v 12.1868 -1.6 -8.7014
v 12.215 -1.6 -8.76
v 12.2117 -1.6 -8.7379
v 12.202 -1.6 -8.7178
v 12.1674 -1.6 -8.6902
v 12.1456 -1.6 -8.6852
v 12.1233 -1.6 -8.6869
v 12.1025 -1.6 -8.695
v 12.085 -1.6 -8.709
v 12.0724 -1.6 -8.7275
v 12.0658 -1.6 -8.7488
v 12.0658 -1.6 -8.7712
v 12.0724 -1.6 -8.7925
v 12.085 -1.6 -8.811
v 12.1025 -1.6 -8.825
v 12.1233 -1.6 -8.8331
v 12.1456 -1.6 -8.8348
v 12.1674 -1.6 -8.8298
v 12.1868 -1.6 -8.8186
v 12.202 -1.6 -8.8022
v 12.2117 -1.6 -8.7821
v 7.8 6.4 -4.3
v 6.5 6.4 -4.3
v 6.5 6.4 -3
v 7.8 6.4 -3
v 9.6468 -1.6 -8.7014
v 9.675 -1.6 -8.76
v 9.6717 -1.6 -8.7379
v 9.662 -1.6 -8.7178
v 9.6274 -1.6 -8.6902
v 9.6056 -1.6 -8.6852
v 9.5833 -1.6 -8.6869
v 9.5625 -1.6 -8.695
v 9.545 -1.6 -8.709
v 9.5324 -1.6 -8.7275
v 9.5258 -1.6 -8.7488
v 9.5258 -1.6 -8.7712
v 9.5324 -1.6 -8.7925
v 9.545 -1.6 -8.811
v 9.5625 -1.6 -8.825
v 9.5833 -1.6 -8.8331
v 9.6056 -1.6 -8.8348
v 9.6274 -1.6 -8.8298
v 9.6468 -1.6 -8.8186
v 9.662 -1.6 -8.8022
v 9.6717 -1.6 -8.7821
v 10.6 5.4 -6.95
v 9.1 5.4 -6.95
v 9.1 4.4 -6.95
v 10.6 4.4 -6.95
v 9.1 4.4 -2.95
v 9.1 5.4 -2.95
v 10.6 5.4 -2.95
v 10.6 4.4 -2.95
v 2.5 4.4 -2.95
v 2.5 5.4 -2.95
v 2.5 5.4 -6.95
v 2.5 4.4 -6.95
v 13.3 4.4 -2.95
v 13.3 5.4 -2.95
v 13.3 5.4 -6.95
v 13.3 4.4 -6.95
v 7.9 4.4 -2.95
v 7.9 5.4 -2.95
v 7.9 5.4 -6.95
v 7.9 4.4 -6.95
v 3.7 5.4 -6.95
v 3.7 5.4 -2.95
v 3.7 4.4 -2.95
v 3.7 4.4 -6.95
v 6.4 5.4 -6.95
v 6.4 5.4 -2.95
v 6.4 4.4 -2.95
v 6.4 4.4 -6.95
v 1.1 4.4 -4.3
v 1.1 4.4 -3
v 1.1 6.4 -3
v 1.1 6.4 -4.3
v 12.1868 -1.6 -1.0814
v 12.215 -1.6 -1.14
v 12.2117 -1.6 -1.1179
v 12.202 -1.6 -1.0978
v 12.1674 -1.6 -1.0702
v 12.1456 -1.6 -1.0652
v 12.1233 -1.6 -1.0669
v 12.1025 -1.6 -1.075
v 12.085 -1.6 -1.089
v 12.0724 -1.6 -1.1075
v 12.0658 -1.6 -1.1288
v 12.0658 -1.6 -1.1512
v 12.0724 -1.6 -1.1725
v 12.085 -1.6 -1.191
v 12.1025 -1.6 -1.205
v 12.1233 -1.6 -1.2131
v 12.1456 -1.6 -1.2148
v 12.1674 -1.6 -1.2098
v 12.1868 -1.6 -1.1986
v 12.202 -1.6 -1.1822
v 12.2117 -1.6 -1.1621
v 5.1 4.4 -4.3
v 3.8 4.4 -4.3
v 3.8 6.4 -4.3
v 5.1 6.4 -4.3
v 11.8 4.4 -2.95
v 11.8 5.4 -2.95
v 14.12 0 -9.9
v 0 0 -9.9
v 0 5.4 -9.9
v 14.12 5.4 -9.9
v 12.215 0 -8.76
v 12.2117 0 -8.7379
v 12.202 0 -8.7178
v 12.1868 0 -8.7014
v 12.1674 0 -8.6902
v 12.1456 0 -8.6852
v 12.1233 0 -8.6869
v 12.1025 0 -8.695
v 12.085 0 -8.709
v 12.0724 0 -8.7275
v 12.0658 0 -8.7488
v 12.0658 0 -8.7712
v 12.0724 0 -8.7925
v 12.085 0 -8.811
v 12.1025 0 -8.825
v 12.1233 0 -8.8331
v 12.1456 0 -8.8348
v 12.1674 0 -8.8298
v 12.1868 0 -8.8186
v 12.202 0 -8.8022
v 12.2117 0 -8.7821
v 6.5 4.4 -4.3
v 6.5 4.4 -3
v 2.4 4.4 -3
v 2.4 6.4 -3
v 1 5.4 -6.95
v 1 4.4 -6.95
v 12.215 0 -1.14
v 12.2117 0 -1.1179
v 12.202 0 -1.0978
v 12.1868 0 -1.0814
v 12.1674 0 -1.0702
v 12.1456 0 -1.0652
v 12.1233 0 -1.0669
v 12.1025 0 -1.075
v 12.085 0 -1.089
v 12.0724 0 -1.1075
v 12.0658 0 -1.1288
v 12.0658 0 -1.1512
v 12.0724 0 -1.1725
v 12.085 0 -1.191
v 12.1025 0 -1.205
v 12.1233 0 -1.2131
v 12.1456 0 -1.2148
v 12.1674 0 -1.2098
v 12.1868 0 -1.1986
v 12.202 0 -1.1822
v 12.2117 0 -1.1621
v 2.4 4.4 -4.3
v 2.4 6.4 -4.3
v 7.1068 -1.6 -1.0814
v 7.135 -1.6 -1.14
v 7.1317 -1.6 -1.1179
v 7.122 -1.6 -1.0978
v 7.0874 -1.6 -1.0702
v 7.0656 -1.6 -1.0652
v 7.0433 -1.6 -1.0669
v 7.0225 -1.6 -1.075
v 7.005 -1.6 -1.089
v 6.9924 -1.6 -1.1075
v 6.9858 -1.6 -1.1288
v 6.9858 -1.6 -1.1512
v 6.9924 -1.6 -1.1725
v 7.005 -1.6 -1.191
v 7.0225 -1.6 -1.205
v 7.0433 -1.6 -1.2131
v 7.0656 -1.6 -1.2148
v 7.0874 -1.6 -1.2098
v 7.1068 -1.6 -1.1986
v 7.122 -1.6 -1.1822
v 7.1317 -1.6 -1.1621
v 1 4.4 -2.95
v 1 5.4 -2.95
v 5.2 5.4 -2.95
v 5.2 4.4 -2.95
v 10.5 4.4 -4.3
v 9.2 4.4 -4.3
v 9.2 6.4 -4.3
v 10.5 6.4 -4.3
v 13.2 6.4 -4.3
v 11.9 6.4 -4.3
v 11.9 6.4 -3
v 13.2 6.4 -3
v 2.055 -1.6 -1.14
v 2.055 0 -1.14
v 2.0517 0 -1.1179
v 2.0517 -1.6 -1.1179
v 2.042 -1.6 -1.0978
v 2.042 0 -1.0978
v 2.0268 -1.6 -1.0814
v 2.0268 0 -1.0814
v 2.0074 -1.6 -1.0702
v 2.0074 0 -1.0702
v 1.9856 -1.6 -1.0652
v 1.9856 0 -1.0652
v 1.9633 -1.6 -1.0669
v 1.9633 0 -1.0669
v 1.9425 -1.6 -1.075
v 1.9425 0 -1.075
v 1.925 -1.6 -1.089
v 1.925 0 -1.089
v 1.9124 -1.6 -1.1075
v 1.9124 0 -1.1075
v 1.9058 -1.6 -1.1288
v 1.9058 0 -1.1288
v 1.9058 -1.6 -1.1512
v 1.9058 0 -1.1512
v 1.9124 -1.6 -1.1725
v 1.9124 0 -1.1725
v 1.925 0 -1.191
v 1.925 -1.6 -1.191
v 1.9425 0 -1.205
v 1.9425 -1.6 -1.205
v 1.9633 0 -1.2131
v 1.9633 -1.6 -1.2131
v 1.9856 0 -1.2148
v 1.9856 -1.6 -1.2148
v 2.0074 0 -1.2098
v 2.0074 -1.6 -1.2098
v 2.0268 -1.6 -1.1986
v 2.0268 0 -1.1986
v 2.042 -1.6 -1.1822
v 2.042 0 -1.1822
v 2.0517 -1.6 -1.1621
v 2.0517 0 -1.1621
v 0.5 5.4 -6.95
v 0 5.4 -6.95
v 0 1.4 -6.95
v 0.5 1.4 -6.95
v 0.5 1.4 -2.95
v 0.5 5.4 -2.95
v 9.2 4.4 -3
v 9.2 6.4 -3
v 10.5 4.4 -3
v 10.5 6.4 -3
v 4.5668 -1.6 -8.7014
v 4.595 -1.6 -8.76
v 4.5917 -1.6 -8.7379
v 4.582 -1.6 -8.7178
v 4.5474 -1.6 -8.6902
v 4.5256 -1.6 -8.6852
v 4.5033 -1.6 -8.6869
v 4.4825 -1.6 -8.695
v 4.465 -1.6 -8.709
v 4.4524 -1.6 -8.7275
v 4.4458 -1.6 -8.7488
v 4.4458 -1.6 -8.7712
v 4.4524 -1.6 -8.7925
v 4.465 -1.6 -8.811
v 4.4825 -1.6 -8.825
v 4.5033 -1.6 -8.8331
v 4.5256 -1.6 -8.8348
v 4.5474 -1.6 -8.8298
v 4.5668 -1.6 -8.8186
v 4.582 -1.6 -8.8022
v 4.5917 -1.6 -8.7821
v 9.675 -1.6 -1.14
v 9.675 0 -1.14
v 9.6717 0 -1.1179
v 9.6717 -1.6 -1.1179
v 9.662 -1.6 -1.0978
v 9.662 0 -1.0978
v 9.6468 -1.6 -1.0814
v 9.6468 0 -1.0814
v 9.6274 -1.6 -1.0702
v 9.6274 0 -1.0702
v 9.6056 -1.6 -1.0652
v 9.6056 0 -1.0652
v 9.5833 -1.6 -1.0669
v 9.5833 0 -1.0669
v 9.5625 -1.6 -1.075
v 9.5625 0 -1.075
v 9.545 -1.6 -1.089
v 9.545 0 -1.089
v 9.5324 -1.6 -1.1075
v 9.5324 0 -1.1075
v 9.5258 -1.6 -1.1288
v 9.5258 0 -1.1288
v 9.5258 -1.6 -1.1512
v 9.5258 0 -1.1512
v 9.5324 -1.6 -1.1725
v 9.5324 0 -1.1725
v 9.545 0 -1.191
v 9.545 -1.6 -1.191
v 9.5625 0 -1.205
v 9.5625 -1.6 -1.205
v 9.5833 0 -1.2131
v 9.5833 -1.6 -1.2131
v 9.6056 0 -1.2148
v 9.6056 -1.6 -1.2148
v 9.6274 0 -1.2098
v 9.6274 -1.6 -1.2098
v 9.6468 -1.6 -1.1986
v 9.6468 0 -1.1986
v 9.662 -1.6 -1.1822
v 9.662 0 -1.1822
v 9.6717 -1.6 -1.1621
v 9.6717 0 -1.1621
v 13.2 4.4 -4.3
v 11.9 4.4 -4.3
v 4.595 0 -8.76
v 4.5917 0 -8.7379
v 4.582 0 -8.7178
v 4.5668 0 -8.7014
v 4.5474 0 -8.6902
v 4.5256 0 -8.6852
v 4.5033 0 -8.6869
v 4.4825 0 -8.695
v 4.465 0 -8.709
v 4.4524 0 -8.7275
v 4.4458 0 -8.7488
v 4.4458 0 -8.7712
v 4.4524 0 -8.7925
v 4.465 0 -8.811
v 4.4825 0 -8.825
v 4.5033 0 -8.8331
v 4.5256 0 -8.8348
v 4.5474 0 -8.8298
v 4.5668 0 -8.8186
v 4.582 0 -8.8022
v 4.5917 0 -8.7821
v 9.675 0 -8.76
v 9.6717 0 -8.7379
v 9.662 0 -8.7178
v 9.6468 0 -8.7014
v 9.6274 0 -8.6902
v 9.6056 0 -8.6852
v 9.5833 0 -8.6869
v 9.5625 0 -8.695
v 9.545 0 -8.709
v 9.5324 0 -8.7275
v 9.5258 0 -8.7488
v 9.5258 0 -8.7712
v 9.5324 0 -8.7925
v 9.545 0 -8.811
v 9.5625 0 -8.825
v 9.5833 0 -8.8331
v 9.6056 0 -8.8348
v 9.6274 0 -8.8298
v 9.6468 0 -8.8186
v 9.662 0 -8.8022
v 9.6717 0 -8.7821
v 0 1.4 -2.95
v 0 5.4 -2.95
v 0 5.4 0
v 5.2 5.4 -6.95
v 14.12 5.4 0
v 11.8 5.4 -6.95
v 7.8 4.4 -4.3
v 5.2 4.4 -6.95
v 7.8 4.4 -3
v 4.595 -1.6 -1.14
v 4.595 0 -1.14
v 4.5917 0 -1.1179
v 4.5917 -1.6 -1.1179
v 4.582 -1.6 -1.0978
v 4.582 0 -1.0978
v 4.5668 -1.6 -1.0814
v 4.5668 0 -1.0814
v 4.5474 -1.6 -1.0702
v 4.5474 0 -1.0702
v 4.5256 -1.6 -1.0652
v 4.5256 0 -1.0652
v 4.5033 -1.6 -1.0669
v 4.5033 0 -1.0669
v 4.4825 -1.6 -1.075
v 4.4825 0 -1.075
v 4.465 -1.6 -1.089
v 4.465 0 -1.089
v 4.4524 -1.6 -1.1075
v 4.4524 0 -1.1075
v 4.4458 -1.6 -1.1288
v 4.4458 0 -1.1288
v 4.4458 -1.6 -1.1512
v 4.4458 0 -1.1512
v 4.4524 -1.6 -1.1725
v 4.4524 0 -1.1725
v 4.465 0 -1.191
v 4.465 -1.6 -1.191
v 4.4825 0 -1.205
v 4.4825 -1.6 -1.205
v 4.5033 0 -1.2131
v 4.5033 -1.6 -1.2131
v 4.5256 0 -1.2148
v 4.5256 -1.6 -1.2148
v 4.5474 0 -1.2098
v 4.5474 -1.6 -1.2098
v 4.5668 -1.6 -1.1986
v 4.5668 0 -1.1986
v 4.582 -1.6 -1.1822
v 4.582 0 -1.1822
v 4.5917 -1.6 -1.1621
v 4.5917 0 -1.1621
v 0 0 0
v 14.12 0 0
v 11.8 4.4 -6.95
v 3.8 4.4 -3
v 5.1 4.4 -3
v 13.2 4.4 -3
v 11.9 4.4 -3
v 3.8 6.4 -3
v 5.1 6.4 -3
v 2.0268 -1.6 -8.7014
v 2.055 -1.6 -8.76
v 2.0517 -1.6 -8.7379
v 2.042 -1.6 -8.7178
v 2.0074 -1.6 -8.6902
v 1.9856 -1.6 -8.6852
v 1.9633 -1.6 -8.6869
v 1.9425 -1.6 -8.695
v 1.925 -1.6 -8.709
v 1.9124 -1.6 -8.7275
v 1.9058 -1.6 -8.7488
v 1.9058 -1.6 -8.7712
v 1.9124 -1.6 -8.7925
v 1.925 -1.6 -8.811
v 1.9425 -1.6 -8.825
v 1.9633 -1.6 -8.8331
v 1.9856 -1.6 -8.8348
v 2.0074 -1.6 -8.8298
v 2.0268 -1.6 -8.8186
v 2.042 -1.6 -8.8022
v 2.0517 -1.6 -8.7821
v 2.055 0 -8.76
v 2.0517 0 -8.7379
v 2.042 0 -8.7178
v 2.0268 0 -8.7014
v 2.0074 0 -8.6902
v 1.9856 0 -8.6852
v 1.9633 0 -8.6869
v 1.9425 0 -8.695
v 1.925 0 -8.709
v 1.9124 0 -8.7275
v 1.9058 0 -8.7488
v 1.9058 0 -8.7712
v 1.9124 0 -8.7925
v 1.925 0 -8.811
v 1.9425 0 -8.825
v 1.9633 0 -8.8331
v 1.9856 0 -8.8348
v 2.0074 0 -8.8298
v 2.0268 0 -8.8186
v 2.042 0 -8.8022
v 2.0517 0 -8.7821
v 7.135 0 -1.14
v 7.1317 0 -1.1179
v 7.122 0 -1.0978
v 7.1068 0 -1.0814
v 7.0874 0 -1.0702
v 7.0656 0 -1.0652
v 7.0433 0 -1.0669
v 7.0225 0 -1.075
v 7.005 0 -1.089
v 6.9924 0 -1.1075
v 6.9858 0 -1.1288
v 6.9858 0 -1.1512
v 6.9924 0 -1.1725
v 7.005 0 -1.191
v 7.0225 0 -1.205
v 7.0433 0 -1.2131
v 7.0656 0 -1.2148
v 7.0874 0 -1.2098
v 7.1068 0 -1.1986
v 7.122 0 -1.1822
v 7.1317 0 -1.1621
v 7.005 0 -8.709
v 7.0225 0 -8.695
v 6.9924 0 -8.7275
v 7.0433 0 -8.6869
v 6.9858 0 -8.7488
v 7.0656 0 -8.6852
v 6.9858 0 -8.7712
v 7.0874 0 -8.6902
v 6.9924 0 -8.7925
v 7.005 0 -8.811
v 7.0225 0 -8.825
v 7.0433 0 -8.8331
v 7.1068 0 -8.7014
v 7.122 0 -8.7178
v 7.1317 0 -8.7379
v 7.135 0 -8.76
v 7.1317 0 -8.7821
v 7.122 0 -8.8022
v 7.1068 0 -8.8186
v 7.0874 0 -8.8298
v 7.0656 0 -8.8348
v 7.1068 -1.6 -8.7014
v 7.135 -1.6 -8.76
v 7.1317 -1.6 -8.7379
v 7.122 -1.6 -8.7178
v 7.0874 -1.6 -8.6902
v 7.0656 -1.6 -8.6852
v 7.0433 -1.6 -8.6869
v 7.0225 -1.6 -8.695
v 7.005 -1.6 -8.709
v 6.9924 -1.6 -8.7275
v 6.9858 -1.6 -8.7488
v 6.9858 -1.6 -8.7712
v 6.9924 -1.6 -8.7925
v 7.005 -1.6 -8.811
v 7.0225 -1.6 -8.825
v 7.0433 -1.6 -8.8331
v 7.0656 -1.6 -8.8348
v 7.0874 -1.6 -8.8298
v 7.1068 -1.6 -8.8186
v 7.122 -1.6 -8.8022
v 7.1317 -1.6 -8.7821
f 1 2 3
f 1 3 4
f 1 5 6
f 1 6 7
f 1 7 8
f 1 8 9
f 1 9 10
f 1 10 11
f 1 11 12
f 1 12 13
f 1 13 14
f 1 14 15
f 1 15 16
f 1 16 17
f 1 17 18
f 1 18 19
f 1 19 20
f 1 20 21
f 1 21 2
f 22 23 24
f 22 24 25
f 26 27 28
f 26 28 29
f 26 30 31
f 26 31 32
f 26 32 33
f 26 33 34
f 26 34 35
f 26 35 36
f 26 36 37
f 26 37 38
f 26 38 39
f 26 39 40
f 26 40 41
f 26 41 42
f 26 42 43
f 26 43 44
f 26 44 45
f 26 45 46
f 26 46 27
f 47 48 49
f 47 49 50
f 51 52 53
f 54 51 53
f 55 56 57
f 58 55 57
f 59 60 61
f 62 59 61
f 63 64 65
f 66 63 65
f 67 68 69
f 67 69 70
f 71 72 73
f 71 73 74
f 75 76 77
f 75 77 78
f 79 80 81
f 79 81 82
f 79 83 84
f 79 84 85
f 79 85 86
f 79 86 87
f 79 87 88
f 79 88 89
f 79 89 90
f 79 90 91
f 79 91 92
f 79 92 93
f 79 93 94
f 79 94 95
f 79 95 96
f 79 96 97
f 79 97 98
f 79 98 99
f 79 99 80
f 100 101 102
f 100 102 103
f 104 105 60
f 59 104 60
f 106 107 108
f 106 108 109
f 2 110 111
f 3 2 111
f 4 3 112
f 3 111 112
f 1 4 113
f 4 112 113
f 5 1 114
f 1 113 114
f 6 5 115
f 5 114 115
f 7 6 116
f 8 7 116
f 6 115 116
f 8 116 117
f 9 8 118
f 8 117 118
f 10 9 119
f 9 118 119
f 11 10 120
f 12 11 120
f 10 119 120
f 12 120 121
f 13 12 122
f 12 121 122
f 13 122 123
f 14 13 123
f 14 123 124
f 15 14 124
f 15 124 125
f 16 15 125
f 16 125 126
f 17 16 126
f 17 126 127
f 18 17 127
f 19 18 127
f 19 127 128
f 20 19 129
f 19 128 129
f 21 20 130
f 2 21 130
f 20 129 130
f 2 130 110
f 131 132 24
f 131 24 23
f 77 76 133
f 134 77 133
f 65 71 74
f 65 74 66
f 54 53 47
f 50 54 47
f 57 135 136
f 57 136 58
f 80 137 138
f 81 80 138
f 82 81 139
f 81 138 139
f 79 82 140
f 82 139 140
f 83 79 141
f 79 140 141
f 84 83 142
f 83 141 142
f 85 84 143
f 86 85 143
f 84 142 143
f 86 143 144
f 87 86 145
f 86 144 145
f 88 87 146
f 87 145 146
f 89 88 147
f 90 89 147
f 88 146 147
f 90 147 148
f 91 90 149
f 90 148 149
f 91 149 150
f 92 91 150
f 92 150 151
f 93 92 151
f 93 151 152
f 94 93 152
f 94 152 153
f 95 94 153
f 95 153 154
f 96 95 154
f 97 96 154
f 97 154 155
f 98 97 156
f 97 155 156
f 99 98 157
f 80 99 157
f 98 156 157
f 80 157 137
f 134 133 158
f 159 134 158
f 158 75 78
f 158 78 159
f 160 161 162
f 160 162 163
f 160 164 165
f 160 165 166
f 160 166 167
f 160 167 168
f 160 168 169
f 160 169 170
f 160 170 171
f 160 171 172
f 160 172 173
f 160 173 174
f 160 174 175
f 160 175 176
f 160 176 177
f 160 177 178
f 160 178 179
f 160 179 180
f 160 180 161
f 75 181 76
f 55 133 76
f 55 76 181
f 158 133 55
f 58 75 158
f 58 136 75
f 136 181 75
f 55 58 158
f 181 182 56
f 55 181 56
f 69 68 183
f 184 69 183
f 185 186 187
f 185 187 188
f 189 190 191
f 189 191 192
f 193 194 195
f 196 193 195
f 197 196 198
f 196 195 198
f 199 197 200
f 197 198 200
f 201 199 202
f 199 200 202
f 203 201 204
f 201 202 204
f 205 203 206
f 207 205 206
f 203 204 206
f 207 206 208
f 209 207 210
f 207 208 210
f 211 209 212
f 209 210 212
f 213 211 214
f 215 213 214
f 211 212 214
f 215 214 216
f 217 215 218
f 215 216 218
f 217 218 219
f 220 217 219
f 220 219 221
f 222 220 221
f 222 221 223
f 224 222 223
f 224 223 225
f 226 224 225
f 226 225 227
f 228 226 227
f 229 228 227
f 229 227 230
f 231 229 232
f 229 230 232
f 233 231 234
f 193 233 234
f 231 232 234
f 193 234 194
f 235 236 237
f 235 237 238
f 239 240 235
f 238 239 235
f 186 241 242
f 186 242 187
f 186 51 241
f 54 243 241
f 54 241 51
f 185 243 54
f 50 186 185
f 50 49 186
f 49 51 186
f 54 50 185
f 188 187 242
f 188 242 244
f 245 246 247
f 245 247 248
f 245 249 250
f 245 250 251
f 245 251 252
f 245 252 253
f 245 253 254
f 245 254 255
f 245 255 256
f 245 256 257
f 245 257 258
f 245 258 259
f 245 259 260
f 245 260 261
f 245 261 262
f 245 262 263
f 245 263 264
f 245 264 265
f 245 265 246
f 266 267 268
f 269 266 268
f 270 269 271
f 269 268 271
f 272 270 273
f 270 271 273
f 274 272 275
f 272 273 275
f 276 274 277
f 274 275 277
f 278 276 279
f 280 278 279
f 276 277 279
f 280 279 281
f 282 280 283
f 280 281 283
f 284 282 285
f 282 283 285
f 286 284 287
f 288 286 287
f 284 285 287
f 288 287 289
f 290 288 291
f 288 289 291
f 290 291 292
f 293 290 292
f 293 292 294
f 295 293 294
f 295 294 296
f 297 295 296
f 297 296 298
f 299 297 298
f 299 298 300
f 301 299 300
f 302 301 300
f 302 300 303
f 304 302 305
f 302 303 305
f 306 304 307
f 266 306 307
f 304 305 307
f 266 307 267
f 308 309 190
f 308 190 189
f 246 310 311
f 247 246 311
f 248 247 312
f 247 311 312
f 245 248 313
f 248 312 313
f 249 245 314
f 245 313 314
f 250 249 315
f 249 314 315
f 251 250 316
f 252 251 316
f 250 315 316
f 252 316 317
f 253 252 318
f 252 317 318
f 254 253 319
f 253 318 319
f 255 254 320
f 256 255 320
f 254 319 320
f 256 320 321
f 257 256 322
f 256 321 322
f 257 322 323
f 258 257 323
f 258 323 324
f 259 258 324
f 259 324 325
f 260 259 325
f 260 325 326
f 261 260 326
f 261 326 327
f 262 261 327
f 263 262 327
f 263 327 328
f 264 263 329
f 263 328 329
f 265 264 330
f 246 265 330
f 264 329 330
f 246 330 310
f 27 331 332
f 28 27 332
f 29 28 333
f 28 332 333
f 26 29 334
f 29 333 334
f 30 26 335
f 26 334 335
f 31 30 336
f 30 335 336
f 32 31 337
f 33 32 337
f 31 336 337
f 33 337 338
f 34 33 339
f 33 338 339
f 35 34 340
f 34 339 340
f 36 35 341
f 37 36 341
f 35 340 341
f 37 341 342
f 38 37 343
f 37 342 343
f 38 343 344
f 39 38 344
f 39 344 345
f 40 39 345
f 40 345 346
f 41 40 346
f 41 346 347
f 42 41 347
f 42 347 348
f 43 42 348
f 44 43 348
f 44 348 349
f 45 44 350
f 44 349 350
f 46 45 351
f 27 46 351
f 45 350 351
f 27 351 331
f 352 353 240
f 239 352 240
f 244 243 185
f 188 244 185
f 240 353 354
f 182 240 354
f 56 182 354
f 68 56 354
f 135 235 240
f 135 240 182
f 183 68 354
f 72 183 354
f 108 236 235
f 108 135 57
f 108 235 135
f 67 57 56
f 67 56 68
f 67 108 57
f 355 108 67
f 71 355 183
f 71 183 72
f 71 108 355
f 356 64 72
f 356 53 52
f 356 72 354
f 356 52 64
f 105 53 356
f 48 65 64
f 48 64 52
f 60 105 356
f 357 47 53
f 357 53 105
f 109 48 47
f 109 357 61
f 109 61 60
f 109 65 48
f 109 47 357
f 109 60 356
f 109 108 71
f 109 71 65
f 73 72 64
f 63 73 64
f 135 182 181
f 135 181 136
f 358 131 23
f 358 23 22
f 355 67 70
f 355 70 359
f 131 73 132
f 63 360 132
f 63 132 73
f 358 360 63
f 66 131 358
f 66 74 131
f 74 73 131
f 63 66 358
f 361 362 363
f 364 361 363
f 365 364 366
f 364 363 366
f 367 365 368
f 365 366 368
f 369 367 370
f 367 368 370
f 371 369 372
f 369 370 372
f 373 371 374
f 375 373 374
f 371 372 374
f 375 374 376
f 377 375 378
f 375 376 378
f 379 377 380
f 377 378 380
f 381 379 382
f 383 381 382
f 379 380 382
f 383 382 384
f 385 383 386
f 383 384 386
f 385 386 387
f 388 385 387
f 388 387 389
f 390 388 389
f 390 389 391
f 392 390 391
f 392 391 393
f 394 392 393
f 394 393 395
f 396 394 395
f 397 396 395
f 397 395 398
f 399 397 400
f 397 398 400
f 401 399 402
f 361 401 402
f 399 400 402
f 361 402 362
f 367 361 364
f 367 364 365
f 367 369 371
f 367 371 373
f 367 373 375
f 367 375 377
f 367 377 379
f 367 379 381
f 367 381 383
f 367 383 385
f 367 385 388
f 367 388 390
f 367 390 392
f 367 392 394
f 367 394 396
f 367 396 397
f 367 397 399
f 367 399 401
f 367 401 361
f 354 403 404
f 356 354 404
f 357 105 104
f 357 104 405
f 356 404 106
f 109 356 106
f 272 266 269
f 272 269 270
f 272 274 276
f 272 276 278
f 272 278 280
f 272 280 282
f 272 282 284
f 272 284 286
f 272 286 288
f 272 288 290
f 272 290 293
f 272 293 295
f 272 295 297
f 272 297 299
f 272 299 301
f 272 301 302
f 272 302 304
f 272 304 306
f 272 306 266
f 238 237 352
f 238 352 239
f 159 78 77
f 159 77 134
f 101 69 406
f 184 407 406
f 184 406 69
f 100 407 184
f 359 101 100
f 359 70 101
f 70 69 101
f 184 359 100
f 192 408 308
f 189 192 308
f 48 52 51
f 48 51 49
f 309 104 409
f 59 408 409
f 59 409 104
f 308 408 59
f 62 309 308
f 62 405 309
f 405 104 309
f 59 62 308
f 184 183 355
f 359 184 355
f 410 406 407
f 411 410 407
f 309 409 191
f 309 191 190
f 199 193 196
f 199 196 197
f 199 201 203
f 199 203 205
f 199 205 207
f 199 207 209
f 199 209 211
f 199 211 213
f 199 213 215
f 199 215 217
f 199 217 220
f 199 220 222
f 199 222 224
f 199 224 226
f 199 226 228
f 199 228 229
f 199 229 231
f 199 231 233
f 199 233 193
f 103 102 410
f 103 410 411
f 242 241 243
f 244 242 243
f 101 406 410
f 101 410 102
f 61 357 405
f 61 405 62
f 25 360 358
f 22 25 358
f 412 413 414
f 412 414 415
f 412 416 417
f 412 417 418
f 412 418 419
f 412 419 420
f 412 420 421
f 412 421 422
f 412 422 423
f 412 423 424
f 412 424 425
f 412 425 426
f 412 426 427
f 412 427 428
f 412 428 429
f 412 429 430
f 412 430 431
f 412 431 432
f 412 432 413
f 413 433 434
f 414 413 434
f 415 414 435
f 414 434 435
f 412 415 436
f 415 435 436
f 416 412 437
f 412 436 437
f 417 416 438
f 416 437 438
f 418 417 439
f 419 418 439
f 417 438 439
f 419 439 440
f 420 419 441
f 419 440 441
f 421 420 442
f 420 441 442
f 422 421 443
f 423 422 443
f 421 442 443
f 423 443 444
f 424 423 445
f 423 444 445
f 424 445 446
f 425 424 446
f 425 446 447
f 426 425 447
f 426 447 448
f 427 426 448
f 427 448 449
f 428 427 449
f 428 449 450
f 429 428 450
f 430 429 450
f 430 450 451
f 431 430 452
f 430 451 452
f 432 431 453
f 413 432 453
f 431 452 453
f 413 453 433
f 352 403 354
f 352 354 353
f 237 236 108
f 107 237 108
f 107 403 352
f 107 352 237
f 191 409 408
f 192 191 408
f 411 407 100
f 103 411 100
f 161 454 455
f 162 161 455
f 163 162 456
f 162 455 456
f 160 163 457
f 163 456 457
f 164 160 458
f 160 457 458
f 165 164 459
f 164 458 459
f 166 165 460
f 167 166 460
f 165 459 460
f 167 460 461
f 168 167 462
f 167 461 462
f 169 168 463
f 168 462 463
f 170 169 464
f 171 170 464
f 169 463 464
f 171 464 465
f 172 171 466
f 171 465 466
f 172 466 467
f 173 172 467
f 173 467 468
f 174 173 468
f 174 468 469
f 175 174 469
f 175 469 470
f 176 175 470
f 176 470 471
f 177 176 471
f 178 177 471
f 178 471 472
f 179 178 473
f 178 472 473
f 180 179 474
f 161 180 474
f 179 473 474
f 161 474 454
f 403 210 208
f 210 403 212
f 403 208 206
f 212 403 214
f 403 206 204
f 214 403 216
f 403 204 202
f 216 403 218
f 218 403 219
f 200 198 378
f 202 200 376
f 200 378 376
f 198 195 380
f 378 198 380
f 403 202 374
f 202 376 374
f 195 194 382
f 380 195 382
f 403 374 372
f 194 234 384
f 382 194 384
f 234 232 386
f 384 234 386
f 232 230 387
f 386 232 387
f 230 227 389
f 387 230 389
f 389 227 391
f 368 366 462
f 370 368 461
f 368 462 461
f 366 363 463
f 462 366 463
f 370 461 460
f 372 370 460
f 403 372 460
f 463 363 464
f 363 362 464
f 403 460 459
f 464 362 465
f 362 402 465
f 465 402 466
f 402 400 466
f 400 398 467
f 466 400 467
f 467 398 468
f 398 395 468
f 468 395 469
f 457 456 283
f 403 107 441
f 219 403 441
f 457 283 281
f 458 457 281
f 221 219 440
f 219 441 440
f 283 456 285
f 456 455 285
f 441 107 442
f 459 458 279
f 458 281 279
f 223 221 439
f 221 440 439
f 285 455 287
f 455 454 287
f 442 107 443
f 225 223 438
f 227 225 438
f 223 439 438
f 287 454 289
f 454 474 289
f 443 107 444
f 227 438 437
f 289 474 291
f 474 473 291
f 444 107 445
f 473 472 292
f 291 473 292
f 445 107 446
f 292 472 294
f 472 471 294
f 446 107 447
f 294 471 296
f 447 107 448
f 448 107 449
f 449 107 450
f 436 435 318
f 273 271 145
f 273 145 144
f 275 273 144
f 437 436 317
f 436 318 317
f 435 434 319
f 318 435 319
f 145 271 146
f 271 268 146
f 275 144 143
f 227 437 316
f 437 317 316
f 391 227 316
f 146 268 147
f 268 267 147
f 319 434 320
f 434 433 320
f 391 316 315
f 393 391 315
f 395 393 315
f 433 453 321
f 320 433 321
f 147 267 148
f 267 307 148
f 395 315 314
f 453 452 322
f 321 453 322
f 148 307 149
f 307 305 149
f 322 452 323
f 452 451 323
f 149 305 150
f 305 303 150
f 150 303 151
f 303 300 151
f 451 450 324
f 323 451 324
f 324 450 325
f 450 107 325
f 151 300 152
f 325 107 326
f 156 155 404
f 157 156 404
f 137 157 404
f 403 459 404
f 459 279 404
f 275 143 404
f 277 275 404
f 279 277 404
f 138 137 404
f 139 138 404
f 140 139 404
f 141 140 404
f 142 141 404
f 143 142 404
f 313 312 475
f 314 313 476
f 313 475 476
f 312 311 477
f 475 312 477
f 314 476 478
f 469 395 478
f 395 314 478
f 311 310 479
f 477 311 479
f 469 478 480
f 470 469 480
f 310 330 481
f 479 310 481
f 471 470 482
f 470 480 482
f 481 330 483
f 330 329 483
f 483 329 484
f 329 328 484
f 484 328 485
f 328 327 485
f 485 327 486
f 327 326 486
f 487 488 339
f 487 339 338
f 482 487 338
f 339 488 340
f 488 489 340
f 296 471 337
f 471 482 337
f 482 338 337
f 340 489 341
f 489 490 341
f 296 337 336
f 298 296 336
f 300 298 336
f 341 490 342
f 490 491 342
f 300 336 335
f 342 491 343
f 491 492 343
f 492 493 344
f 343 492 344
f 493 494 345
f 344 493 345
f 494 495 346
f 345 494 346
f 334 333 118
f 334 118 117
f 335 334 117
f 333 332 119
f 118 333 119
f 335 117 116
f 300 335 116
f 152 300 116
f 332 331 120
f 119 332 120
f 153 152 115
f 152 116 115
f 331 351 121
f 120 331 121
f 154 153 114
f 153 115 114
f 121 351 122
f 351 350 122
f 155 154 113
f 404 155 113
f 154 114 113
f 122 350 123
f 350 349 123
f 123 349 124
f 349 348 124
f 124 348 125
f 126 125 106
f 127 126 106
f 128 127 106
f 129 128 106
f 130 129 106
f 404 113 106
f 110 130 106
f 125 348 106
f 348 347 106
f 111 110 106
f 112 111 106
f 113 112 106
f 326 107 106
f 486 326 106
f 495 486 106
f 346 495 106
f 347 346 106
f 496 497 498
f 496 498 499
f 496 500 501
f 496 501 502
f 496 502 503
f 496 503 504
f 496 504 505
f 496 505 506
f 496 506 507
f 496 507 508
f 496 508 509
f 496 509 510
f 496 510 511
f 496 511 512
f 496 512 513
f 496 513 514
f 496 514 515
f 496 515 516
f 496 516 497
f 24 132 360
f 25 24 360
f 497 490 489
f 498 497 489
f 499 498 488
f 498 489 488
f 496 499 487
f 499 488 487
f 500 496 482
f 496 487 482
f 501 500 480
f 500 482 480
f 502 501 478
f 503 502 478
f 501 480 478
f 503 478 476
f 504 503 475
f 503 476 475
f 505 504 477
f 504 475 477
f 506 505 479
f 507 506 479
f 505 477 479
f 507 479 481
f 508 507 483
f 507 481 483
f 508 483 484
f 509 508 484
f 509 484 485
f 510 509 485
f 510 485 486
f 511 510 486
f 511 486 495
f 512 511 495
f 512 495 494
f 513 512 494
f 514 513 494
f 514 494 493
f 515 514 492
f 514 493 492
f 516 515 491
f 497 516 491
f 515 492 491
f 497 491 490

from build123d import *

# Parameters (mm, degrees)
SKETCH_1_W          = 14.12
SKETCH_1_H          = 9.9
EXTRUDE_1_DEPTH     = 5.4
SKETCH_2_R          = 0.075
EXTRUDE_2_DEPTH     = 1.6
SKETCH_3_W          = 0.5
SKETCH_3_H          = 4
CUT_EXTRUDE_1_DEPTH = 4
SKETCH_4_W          = 1.5
SKETCH_4_H          = 4
CUT_EXTRUDE_2_DEPTH = 1
SKETCH_5_W          = 1.3
SKETCH_5_H          = 1.3
EXTRUDE_3_DEPTH     = 2


with BuildPart() as part:
    # 草图1 → 凸台-拉伸1 (new body)
    with BuildSketch(Plane(origin=(0, 0, 0), x_dir=(1, 0, 0), z_dir=(0, 1, 0))):
        with Locations((7.06, 4.95)):
            Rectangle(SKETCH_1_W, SKETCH_1_H)
    extrude(amount=EXTRUDE_1_DEPTH)

    # 草图2 → 凸台-拉伸2 (add)
    with BuildSketch(Plane.XZ):
        with Locations((1.98, -1.14)):
            Circle(SKETCH_2_R)
        with Locations((4.52, -1.14)):
            Circle(SKETCH_2_R)
        with Locations((7.06, -1.14)):
            Circle(SKETCH_2_R)
        with Locations((9.6, -1.14)):
            Circle(SKETCH_2_R)
        with Locations((12.14, -1.14)):
            Circle(SKETCH_2_R)
        with Locations((4.52, -8.76)):
            Circle(SKETCH_2_R)
        with Locations((7.06, -8.76)):
            Circle(SKETCH_2_R)
        with Locations((9.6, -8.76)):
            Circle(SKETCH_2_R)
        with Locations((12.14, -8.76)):
            Circle(SKETCH_2_R)
        with Locations((1.98, -8.76)):
            Circle(SKETCH_2_R)
    extrude(amount=EXTRUDE_2_DEPTH)

    # 草图3 → 切除-拉伸1 (cut)
    with BuildSketch(Plane(origin=(0, 5.4, 0), x_dir=(1, 0, 0), z_dir=(0, 1, 0))):
        with Locations((0.25, 4.95)):
            Rectangle(SKETCH_3_W, SKETCH_3_H)
    extrude(amount=-CUT_EXTRUDE_1_DEPTH, mode=Mode.SUBTRACT)

    # 草图4 → 切除-拉伸2 (cut)
    with BuildSketch(Plane(origin=(0, 5.4, 0), x_dir=(1, 0, 0), z_dir=(0, 1, 0))):
        with Locations((4.45, 4.95)):
            Rectangle(SKETCH_4_W, SKETCH_4_H)
        with Locations((1.75, 4.95)):
            Rectangle(SKETCH_4_W, SKETCH_4_H)
        with Locations((7.15, 4.95)):
            Rectangle(SKETCH_4_W, SKETCH_4_H)
        with Locations((9.85, 4.95)):
            Rectangle(SKETCH_4_W, SKETCH_4_H)
        with Locations((12.55, 4.95)):
            Rectangle(SKETCH_4_W, SKETCH_4_H)
    extrude(amount=-CUT_EXTRUDE_2_DEPTH, mode=Mode.SUBTRACT)

    # 草图5 → 凸台-拉伸3 (add)
    with BuildSketch(Plane(origin=(0, 4.4, 0), x_dir=(1, 0, 0), z_dir=(0, 1, 0))):
        with Locations((4.45, 3.65)):
            Rectangle(SKETCH_5_W, SKETCH_5_H)
        with Locations((1.75, 3.65)):
            Rectangle(SKETCH_5_W, SKETCH_5_H)
        with Locations((7.15, 3.65)):
            Rectangle(SKETCH_5_W, SKETCH_5_H)
        with Locations((9.85, 3.65)):
            Rectangle(SKETCH_5_W, SKETCH_5_H)
        with Locations((12.55, 3.65)):
            Rectangle(SKETCH_5_W, SKETCH_5_H)
    extrude(amount=EXTRUDE_3_DEPTH)


solid = part.part
